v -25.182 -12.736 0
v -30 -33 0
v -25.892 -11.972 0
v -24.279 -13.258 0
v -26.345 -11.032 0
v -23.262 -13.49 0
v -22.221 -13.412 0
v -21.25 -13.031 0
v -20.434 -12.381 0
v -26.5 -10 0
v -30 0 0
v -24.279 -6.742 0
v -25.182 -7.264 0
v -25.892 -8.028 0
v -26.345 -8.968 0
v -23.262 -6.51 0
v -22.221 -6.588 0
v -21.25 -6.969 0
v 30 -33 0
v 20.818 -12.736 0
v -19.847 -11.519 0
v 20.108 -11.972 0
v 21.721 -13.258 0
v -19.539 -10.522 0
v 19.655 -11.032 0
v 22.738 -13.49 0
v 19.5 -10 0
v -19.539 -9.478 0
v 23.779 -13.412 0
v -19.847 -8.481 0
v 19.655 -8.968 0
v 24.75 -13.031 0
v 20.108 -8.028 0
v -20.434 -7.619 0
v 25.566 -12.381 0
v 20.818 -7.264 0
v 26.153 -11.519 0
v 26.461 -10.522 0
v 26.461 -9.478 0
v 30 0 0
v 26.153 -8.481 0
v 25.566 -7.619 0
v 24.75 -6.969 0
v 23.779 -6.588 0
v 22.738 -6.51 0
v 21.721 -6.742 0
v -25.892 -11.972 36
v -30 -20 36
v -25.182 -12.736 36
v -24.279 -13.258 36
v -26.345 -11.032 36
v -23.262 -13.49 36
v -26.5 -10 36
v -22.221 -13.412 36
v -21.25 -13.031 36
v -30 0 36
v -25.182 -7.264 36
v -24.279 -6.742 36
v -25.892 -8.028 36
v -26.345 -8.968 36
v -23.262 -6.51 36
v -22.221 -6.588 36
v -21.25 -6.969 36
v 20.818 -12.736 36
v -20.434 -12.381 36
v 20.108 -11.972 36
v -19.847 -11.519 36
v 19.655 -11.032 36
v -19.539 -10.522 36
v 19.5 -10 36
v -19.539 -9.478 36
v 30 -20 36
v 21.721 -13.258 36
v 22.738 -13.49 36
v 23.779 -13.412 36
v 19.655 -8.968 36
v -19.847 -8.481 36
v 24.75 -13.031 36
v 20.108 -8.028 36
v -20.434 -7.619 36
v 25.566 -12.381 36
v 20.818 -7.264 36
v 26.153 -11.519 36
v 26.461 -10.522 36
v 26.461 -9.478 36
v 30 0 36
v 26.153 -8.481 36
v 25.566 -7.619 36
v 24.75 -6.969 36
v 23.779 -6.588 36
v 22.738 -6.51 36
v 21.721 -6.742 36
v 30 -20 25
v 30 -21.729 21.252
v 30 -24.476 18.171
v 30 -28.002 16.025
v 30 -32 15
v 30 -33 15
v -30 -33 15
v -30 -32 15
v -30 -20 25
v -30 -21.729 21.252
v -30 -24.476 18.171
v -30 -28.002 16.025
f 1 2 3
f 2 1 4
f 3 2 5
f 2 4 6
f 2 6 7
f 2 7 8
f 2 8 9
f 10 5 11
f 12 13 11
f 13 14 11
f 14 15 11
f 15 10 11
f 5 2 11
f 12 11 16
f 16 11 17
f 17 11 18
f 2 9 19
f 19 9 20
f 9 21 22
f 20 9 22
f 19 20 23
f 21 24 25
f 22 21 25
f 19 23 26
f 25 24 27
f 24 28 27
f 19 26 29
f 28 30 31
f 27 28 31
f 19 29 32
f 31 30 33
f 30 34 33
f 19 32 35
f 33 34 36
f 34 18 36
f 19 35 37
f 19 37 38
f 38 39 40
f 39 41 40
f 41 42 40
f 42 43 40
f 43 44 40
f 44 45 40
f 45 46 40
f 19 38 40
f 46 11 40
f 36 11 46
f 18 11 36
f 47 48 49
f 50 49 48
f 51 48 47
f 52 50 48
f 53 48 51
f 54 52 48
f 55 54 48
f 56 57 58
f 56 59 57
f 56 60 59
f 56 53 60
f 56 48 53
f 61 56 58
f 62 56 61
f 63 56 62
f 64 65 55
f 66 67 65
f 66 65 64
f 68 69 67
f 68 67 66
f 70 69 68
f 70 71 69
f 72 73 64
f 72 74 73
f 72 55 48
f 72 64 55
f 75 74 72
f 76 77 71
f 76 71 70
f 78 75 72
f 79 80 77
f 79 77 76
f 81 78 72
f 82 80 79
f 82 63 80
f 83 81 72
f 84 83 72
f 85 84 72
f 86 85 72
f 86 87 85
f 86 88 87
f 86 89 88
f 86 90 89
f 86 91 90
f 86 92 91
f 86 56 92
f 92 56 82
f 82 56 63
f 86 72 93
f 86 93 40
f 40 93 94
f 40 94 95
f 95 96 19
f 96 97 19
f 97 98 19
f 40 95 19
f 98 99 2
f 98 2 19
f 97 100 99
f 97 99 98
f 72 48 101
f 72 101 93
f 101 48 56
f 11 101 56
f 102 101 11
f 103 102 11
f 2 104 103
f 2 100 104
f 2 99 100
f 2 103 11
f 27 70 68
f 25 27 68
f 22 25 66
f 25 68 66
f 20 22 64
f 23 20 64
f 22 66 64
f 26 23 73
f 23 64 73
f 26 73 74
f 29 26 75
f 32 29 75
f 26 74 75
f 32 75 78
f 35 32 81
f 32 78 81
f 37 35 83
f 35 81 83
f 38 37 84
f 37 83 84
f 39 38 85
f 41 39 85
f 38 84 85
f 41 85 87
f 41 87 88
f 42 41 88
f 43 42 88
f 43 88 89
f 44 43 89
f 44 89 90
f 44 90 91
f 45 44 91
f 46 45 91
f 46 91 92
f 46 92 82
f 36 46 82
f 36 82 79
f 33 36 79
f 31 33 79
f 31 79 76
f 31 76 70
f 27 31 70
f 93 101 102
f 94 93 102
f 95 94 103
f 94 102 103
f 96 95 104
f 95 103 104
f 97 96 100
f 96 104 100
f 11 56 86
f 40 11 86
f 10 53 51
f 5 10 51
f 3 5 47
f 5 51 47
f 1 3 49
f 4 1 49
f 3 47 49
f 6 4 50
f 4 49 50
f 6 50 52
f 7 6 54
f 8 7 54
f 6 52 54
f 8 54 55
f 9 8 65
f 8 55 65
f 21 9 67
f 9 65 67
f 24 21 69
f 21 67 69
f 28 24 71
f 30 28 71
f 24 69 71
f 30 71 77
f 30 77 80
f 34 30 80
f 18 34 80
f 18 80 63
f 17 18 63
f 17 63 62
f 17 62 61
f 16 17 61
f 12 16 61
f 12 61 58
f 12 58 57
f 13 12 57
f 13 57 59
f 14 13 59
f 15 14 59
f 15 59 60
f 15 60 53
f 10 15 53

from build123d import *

# Parameters (mm, degrees)
SKETCH_W     = 60
SKETCH_H     = 36
PAD_DEPTH    = 20
SKETCH001_R  = 3.5
POCKET_DEPTH = 36.001
SKETCH004_W  = 60
SKETCH004_H  = 15
PAD003_DEPTH = 13
PAD004_DEPTH = 60


with BuildPart() as part:
    # Sketch → Pad (new body)
    with BuildSketch(Plane.XZ):
        with Locations((0, 18)):
            Rectangle(SKETCH_W, SKETCH_H)
    extrude(amount=PAD_DEPTH)

    # Sketch001 (on Face3 of Pad) → Pocket (cut, through all)
    with BuildSketch(Plane(origin=(0, 0, 36), x_dir=(-1, 0, 0), z_dir=(0, 0, 1))):
        with Locations((-23, 10)):
            Circle(SKETCH001_R)
        with Locations((23, 10)):
            Circle(SKETCH001_R)
    extrude(amount=-POCKET_DEPTH, mode=Mode.SUBTRACT)

    # Sketch004 → Pad003 (join)
    with BuildSketch(Plane.XZ.offset(20)):
        with Locations((0, 7.5)):
            Rectangle(SKETCH004_W, SKETCH004_H)
    extrude(amount=PAD003_DEPTH)

    # Sketch005 (on Face2 of Pad003) → Pad004 (join)
    with BuildSketch(Plane(origin=(-30, 0, 0), x_dir=(0, 0, -1), z_dir=(-1, 0, 0))):
        with BuildLine():
            Line((-25, 20), (-15, 20))
            Line((-15, 20), (-15, 32))
            ThreePointArc((-25, 20), (-18.170827, 24.475689), (-15, 32))
        make_face()
    extrude(amount=-PAD004_DEPTH)


solid = part.part
